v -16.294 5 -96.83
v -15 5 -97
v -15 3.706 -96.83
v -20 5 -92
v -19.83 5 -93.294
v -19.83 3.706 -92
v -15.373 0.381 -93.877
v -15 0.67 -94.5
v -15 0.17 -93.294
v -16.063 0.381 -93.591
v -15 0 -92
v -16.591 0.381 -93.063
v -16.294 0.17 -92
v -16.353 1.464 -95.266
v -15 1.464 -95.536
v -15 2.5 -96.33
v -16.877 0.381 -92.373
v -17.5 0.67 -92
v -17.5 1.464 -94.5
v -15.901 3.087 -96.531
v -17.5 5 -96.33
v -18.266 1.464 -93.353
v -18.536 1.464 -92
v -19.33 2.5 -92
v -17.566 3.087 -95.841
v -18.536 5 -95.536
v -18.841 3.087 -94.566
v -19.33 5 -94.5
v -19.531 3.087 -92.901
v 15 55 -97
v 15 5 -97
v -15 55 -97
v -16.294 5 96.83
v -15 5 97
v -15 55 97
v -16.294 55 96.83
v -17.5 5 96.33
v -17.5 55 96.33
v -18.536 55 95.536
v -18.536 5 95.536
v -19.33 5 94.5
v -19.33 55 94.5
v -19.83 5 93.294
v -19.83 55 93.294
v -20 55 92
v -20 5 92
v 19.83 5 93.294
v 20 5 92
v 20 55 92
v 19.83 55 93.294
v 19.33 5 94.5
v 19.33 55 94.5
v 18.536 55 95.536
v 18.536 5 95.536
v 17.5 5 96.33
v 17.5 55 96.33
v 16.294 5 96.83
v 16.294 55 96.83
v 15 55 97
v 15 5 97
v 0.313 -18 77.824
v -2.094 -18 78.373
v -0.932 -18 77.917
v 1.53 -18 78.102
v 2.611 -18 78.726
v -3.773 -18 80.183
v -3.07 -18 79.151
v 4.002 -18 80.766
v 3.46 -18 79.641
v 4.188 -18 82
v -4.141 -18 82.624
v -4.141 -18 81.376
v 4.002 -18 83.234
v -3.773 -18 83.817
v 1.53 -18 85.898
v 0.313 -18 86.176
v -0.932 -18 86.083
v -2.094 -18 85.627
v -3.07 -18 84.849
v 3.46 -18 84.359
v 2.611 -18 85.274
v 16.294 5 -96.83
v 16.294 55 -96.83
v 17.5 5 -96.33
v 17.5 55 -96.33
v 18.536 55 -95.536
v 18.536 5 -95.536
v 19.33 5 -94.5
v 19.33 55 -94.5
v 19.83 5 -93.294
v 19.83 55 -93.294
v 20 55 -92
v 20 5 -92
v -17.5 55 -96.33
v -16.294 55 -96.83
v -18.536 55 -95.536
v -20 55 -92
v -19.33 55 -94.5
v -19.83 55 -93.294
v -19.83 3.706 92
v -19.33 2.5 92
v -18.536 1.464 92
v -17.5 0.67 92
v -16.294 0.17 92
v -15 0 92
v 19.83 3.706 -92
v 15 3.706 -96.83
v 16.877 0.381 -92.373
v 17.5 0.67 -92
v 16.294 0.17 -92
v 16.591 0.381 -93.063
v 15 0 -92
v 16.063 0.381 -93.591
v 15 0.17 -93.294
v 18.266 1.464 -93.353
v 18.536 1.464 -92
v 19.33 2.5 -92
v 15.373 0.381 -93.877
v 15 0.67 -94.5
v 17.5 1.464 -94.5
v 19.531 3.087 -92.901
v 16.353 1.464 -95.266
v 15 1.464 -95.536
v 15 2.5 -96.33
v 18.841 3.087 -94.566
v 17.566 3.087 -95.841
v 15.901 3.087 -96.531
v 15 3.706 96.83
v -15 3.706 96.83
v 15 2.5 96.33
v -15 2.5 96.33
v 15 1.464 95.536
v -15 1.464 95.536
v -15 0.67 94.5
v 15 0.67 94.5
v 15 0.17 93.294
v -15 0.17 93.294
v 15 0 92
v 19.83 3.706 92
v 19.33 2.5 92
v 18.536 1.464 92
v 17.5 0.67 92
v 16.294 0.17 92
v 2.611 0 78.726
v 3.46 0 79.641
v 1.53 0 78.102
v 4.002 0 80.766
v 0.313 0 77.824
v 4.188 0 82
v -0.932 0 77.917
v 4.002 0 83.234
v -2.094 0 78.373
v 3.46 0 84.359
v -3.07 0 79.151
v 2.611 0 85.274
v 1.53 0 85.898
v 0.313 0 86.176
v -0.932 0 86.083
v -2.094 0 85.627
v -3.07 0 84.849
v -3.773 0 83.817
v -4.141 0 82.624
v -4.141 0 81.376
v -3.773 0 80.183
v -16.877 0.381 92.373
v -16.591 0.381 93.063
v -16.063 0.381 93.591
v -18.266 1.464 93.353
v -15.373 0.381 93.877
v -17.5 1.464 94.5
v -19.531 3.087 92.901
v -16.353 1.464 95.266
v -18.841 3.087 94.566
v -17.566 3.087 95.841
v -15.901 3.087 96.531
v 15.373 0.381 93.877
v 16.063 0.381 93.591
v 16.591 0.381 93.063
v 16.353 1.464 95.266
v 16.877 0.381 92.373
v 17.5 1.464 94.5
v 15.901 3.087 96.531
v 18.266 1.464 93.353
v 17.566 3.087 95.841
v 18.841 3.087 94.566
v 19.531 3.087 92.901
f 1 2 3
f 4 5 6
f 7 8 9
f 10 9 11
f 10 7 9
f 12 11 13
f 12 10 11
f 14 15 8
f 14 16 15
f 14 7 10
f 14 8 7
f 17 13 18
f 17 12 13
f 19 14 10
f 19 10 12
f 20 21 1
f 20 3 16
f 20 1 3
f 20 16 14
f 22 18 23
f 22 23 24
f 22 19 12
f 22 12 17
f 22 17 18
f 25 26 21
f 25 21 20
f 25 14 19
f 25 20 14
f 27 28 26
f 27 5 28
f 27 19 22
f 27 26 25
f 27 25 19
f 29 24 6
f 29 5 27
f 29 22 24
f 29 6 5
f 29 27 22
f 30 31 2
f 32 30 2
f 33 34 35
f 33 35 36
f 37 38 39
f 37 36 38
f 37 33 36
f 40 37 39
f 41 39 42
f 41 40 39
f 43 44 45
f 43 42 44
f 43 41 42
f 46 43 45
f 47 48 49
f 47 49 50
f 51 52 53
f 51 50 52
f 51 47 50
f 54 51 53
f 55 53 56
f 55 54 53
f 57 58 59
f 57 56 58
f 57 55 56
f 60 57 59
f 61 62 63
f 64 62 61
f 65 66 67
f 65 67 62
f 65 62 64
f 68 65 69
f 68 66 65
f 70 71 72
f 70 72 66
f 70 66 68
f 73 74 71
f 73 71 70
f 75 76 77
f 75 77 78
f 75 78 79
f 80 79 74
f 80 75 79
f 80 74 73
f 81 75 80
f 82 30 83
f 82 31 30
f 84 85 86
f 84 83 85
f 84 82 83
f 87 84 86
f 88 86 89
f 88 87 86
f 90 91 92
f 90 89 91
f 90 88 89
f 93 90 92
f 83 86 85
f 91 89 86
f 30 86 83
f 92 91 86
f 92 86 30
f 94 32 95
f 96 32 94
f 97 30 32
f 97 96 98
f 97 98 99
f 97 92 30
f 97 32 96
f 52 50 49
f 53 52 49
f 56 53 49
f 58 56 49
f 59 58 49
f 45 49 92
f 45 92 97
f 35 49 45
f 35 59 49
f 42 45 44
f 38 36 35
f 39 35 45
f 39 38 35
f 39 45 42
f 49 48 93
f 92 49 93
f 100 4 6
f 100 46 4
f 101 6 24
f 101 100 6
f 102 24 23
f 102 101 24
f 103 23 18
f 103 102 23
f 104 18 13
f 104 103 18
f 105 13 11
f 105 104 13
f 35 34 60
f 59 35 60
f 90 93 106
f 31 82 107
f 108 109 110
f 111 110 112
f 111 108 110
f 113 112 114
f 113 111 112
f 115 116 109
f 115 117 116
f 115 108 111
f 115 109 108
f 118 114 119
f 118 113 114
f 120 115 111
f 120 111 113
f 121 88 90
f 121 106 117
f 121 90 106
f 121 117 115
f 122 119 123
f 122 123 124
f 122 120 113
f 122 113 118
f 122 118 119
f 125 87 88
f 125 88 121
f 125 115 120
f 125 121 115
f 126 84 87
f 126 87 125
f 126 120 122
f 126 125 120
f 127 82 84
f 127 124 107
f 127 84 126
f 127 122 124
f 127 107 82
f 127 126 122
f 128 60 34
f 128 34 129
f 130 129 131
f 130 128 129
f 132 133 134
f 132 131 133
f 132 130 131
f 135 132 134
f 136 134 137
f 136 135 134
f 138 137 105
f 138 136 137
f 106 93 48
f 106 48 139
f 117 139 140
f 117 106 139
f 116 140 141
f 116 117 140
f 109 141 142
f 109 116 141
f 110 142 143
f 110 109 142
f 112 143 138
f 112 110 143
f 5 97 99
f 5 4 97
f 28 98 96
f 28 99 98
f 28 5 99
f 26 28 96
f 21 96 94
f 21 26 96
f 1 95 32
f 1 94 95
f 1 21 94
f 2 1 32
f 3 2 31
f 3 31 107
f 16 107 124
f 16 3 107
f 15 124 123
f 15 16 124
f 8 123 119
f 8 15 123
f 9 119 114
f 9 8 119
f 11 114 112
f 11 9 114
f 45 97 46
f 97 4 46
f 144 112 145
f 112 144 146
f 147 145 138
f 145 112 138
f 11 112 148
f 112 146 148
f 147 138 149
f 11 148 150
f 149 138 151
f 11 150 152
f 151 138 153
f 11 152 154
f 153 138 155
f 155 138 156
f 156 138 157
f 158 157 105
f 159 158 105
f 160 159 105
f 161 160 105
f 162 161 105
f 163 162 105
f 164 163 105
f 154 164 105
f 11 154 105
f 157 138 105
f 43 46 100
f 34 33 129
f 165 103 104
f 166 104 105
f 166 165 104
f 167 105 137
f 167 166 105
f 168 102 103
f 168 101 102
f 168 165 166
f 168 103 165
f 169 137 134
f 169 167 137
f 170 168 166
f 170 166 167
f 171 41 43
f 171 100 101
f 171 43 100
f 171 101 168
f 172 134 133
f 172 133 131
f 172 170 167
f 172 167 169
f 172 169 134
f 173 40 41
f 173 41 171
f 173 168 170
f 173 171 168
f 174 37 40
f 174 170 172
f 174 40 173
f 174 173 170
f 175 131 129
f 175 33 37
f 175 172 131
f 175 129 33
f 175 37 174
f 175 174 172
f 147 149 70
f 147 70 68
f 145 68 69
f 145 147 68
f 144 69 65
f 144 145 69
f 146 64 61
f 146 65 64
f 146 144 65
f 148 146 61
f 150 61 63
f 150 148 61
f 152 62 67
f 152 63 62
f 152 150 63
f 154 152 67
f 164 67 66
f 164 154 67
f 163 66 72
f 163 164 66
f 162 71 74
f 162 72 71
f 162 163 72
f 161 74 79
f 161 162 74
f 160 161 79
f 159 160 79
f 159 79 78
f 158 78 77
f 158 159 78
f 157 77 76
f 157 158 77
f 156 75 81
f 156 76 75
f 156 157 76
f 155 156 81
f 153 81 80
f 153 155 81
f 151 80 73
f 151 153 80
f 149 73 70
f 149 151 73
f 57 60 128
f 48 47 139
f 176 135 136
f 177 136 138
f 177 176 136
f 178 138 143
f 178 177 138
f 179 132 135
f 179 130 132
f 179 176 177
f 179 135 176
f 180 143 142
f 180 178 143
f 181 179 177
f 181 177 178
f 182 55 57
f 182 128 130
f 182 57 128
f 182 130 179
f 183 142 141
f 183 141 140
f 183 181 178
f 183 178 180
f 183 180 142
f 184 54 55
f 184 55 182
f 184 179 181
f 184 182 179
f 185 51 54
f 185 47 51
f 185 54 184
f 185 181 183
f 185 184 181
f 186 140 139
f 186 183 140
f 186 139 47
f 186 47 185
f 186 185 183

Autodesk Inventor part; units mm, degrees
ref_plane "YZ Plane" through (0, 0, 0) normal (1, 0, 0) x (0, 1, 0)
ref_plane "XZ Plane" through (0, 0, 0) normal (0, 1, 0) x (-1, 0, 0)
ref_plane "XY Plane" through (0, 0, 0) normal (0, 0, 1) x (1, 0, 0)
sketch "Skizze1" plane through (0, 0, 0) normal (0, 1, 0) x (-1, 0, 0)
  line L0 (-15, -97) -> (15, -97)
  line L1 (20, -92) -> (20, 92)
  line L2 (15, 97) -> (-15, 97)
  line L3 (-20, 92) -> (-20, -92)
  line L4 (-20, -97) -> (20, 97) construction
  line L5 (20, -97) -> (-20, 97) construction
  arc A0 (20, 95) -> (18, 97) centre (18, 95) ccw
  arc A1 (20, 92) -> (15, 97) centre (15, 92) ccw
  arc A2 (-15, 97) -> (-20, 92) centre (-15, 92) ccw
  arc A3 (-20, -92) -> (-15, -97) centre (-15, -92) ccw
  arc A4 (15, -97) -> (20, -92) centre (15, -92) ccw
  point P0 (0, 0)
  dimension "d0" = 40
  dimension "d1" = 194
  dimension "d3" = 5
  dimension "d4" = 5
extrude "Extrusion1" add sketch "Skizze1" along normal blind 55
sketch "Skizze2" plane through (0, 0, 0) normal (0, -1, 0) x (1, 0, 0)
  circle A0 centre (0, 82) radius 4.188
  line L0 (-15, 97) -> (15, 97) projected
  point P0 (0, 0)
  dimension "d7" = 8.376
  dimension "d8" = 15
extrude "Extrusion2" add sketch "Skizze2" along normal blind 18
fillet "Rundung1" radius 5 8 edges at (18.5355, 0, 95.5355) (20, 0, 0) (18.5355, 0, -95.5355) (0, 0, -97) (-18.5355, 0, -95.5355) (-20, 0, 0) (-18.5355, 0, 95.5355) (0, 0, 97)
properties part number "Schmierung" material "Wasser"
